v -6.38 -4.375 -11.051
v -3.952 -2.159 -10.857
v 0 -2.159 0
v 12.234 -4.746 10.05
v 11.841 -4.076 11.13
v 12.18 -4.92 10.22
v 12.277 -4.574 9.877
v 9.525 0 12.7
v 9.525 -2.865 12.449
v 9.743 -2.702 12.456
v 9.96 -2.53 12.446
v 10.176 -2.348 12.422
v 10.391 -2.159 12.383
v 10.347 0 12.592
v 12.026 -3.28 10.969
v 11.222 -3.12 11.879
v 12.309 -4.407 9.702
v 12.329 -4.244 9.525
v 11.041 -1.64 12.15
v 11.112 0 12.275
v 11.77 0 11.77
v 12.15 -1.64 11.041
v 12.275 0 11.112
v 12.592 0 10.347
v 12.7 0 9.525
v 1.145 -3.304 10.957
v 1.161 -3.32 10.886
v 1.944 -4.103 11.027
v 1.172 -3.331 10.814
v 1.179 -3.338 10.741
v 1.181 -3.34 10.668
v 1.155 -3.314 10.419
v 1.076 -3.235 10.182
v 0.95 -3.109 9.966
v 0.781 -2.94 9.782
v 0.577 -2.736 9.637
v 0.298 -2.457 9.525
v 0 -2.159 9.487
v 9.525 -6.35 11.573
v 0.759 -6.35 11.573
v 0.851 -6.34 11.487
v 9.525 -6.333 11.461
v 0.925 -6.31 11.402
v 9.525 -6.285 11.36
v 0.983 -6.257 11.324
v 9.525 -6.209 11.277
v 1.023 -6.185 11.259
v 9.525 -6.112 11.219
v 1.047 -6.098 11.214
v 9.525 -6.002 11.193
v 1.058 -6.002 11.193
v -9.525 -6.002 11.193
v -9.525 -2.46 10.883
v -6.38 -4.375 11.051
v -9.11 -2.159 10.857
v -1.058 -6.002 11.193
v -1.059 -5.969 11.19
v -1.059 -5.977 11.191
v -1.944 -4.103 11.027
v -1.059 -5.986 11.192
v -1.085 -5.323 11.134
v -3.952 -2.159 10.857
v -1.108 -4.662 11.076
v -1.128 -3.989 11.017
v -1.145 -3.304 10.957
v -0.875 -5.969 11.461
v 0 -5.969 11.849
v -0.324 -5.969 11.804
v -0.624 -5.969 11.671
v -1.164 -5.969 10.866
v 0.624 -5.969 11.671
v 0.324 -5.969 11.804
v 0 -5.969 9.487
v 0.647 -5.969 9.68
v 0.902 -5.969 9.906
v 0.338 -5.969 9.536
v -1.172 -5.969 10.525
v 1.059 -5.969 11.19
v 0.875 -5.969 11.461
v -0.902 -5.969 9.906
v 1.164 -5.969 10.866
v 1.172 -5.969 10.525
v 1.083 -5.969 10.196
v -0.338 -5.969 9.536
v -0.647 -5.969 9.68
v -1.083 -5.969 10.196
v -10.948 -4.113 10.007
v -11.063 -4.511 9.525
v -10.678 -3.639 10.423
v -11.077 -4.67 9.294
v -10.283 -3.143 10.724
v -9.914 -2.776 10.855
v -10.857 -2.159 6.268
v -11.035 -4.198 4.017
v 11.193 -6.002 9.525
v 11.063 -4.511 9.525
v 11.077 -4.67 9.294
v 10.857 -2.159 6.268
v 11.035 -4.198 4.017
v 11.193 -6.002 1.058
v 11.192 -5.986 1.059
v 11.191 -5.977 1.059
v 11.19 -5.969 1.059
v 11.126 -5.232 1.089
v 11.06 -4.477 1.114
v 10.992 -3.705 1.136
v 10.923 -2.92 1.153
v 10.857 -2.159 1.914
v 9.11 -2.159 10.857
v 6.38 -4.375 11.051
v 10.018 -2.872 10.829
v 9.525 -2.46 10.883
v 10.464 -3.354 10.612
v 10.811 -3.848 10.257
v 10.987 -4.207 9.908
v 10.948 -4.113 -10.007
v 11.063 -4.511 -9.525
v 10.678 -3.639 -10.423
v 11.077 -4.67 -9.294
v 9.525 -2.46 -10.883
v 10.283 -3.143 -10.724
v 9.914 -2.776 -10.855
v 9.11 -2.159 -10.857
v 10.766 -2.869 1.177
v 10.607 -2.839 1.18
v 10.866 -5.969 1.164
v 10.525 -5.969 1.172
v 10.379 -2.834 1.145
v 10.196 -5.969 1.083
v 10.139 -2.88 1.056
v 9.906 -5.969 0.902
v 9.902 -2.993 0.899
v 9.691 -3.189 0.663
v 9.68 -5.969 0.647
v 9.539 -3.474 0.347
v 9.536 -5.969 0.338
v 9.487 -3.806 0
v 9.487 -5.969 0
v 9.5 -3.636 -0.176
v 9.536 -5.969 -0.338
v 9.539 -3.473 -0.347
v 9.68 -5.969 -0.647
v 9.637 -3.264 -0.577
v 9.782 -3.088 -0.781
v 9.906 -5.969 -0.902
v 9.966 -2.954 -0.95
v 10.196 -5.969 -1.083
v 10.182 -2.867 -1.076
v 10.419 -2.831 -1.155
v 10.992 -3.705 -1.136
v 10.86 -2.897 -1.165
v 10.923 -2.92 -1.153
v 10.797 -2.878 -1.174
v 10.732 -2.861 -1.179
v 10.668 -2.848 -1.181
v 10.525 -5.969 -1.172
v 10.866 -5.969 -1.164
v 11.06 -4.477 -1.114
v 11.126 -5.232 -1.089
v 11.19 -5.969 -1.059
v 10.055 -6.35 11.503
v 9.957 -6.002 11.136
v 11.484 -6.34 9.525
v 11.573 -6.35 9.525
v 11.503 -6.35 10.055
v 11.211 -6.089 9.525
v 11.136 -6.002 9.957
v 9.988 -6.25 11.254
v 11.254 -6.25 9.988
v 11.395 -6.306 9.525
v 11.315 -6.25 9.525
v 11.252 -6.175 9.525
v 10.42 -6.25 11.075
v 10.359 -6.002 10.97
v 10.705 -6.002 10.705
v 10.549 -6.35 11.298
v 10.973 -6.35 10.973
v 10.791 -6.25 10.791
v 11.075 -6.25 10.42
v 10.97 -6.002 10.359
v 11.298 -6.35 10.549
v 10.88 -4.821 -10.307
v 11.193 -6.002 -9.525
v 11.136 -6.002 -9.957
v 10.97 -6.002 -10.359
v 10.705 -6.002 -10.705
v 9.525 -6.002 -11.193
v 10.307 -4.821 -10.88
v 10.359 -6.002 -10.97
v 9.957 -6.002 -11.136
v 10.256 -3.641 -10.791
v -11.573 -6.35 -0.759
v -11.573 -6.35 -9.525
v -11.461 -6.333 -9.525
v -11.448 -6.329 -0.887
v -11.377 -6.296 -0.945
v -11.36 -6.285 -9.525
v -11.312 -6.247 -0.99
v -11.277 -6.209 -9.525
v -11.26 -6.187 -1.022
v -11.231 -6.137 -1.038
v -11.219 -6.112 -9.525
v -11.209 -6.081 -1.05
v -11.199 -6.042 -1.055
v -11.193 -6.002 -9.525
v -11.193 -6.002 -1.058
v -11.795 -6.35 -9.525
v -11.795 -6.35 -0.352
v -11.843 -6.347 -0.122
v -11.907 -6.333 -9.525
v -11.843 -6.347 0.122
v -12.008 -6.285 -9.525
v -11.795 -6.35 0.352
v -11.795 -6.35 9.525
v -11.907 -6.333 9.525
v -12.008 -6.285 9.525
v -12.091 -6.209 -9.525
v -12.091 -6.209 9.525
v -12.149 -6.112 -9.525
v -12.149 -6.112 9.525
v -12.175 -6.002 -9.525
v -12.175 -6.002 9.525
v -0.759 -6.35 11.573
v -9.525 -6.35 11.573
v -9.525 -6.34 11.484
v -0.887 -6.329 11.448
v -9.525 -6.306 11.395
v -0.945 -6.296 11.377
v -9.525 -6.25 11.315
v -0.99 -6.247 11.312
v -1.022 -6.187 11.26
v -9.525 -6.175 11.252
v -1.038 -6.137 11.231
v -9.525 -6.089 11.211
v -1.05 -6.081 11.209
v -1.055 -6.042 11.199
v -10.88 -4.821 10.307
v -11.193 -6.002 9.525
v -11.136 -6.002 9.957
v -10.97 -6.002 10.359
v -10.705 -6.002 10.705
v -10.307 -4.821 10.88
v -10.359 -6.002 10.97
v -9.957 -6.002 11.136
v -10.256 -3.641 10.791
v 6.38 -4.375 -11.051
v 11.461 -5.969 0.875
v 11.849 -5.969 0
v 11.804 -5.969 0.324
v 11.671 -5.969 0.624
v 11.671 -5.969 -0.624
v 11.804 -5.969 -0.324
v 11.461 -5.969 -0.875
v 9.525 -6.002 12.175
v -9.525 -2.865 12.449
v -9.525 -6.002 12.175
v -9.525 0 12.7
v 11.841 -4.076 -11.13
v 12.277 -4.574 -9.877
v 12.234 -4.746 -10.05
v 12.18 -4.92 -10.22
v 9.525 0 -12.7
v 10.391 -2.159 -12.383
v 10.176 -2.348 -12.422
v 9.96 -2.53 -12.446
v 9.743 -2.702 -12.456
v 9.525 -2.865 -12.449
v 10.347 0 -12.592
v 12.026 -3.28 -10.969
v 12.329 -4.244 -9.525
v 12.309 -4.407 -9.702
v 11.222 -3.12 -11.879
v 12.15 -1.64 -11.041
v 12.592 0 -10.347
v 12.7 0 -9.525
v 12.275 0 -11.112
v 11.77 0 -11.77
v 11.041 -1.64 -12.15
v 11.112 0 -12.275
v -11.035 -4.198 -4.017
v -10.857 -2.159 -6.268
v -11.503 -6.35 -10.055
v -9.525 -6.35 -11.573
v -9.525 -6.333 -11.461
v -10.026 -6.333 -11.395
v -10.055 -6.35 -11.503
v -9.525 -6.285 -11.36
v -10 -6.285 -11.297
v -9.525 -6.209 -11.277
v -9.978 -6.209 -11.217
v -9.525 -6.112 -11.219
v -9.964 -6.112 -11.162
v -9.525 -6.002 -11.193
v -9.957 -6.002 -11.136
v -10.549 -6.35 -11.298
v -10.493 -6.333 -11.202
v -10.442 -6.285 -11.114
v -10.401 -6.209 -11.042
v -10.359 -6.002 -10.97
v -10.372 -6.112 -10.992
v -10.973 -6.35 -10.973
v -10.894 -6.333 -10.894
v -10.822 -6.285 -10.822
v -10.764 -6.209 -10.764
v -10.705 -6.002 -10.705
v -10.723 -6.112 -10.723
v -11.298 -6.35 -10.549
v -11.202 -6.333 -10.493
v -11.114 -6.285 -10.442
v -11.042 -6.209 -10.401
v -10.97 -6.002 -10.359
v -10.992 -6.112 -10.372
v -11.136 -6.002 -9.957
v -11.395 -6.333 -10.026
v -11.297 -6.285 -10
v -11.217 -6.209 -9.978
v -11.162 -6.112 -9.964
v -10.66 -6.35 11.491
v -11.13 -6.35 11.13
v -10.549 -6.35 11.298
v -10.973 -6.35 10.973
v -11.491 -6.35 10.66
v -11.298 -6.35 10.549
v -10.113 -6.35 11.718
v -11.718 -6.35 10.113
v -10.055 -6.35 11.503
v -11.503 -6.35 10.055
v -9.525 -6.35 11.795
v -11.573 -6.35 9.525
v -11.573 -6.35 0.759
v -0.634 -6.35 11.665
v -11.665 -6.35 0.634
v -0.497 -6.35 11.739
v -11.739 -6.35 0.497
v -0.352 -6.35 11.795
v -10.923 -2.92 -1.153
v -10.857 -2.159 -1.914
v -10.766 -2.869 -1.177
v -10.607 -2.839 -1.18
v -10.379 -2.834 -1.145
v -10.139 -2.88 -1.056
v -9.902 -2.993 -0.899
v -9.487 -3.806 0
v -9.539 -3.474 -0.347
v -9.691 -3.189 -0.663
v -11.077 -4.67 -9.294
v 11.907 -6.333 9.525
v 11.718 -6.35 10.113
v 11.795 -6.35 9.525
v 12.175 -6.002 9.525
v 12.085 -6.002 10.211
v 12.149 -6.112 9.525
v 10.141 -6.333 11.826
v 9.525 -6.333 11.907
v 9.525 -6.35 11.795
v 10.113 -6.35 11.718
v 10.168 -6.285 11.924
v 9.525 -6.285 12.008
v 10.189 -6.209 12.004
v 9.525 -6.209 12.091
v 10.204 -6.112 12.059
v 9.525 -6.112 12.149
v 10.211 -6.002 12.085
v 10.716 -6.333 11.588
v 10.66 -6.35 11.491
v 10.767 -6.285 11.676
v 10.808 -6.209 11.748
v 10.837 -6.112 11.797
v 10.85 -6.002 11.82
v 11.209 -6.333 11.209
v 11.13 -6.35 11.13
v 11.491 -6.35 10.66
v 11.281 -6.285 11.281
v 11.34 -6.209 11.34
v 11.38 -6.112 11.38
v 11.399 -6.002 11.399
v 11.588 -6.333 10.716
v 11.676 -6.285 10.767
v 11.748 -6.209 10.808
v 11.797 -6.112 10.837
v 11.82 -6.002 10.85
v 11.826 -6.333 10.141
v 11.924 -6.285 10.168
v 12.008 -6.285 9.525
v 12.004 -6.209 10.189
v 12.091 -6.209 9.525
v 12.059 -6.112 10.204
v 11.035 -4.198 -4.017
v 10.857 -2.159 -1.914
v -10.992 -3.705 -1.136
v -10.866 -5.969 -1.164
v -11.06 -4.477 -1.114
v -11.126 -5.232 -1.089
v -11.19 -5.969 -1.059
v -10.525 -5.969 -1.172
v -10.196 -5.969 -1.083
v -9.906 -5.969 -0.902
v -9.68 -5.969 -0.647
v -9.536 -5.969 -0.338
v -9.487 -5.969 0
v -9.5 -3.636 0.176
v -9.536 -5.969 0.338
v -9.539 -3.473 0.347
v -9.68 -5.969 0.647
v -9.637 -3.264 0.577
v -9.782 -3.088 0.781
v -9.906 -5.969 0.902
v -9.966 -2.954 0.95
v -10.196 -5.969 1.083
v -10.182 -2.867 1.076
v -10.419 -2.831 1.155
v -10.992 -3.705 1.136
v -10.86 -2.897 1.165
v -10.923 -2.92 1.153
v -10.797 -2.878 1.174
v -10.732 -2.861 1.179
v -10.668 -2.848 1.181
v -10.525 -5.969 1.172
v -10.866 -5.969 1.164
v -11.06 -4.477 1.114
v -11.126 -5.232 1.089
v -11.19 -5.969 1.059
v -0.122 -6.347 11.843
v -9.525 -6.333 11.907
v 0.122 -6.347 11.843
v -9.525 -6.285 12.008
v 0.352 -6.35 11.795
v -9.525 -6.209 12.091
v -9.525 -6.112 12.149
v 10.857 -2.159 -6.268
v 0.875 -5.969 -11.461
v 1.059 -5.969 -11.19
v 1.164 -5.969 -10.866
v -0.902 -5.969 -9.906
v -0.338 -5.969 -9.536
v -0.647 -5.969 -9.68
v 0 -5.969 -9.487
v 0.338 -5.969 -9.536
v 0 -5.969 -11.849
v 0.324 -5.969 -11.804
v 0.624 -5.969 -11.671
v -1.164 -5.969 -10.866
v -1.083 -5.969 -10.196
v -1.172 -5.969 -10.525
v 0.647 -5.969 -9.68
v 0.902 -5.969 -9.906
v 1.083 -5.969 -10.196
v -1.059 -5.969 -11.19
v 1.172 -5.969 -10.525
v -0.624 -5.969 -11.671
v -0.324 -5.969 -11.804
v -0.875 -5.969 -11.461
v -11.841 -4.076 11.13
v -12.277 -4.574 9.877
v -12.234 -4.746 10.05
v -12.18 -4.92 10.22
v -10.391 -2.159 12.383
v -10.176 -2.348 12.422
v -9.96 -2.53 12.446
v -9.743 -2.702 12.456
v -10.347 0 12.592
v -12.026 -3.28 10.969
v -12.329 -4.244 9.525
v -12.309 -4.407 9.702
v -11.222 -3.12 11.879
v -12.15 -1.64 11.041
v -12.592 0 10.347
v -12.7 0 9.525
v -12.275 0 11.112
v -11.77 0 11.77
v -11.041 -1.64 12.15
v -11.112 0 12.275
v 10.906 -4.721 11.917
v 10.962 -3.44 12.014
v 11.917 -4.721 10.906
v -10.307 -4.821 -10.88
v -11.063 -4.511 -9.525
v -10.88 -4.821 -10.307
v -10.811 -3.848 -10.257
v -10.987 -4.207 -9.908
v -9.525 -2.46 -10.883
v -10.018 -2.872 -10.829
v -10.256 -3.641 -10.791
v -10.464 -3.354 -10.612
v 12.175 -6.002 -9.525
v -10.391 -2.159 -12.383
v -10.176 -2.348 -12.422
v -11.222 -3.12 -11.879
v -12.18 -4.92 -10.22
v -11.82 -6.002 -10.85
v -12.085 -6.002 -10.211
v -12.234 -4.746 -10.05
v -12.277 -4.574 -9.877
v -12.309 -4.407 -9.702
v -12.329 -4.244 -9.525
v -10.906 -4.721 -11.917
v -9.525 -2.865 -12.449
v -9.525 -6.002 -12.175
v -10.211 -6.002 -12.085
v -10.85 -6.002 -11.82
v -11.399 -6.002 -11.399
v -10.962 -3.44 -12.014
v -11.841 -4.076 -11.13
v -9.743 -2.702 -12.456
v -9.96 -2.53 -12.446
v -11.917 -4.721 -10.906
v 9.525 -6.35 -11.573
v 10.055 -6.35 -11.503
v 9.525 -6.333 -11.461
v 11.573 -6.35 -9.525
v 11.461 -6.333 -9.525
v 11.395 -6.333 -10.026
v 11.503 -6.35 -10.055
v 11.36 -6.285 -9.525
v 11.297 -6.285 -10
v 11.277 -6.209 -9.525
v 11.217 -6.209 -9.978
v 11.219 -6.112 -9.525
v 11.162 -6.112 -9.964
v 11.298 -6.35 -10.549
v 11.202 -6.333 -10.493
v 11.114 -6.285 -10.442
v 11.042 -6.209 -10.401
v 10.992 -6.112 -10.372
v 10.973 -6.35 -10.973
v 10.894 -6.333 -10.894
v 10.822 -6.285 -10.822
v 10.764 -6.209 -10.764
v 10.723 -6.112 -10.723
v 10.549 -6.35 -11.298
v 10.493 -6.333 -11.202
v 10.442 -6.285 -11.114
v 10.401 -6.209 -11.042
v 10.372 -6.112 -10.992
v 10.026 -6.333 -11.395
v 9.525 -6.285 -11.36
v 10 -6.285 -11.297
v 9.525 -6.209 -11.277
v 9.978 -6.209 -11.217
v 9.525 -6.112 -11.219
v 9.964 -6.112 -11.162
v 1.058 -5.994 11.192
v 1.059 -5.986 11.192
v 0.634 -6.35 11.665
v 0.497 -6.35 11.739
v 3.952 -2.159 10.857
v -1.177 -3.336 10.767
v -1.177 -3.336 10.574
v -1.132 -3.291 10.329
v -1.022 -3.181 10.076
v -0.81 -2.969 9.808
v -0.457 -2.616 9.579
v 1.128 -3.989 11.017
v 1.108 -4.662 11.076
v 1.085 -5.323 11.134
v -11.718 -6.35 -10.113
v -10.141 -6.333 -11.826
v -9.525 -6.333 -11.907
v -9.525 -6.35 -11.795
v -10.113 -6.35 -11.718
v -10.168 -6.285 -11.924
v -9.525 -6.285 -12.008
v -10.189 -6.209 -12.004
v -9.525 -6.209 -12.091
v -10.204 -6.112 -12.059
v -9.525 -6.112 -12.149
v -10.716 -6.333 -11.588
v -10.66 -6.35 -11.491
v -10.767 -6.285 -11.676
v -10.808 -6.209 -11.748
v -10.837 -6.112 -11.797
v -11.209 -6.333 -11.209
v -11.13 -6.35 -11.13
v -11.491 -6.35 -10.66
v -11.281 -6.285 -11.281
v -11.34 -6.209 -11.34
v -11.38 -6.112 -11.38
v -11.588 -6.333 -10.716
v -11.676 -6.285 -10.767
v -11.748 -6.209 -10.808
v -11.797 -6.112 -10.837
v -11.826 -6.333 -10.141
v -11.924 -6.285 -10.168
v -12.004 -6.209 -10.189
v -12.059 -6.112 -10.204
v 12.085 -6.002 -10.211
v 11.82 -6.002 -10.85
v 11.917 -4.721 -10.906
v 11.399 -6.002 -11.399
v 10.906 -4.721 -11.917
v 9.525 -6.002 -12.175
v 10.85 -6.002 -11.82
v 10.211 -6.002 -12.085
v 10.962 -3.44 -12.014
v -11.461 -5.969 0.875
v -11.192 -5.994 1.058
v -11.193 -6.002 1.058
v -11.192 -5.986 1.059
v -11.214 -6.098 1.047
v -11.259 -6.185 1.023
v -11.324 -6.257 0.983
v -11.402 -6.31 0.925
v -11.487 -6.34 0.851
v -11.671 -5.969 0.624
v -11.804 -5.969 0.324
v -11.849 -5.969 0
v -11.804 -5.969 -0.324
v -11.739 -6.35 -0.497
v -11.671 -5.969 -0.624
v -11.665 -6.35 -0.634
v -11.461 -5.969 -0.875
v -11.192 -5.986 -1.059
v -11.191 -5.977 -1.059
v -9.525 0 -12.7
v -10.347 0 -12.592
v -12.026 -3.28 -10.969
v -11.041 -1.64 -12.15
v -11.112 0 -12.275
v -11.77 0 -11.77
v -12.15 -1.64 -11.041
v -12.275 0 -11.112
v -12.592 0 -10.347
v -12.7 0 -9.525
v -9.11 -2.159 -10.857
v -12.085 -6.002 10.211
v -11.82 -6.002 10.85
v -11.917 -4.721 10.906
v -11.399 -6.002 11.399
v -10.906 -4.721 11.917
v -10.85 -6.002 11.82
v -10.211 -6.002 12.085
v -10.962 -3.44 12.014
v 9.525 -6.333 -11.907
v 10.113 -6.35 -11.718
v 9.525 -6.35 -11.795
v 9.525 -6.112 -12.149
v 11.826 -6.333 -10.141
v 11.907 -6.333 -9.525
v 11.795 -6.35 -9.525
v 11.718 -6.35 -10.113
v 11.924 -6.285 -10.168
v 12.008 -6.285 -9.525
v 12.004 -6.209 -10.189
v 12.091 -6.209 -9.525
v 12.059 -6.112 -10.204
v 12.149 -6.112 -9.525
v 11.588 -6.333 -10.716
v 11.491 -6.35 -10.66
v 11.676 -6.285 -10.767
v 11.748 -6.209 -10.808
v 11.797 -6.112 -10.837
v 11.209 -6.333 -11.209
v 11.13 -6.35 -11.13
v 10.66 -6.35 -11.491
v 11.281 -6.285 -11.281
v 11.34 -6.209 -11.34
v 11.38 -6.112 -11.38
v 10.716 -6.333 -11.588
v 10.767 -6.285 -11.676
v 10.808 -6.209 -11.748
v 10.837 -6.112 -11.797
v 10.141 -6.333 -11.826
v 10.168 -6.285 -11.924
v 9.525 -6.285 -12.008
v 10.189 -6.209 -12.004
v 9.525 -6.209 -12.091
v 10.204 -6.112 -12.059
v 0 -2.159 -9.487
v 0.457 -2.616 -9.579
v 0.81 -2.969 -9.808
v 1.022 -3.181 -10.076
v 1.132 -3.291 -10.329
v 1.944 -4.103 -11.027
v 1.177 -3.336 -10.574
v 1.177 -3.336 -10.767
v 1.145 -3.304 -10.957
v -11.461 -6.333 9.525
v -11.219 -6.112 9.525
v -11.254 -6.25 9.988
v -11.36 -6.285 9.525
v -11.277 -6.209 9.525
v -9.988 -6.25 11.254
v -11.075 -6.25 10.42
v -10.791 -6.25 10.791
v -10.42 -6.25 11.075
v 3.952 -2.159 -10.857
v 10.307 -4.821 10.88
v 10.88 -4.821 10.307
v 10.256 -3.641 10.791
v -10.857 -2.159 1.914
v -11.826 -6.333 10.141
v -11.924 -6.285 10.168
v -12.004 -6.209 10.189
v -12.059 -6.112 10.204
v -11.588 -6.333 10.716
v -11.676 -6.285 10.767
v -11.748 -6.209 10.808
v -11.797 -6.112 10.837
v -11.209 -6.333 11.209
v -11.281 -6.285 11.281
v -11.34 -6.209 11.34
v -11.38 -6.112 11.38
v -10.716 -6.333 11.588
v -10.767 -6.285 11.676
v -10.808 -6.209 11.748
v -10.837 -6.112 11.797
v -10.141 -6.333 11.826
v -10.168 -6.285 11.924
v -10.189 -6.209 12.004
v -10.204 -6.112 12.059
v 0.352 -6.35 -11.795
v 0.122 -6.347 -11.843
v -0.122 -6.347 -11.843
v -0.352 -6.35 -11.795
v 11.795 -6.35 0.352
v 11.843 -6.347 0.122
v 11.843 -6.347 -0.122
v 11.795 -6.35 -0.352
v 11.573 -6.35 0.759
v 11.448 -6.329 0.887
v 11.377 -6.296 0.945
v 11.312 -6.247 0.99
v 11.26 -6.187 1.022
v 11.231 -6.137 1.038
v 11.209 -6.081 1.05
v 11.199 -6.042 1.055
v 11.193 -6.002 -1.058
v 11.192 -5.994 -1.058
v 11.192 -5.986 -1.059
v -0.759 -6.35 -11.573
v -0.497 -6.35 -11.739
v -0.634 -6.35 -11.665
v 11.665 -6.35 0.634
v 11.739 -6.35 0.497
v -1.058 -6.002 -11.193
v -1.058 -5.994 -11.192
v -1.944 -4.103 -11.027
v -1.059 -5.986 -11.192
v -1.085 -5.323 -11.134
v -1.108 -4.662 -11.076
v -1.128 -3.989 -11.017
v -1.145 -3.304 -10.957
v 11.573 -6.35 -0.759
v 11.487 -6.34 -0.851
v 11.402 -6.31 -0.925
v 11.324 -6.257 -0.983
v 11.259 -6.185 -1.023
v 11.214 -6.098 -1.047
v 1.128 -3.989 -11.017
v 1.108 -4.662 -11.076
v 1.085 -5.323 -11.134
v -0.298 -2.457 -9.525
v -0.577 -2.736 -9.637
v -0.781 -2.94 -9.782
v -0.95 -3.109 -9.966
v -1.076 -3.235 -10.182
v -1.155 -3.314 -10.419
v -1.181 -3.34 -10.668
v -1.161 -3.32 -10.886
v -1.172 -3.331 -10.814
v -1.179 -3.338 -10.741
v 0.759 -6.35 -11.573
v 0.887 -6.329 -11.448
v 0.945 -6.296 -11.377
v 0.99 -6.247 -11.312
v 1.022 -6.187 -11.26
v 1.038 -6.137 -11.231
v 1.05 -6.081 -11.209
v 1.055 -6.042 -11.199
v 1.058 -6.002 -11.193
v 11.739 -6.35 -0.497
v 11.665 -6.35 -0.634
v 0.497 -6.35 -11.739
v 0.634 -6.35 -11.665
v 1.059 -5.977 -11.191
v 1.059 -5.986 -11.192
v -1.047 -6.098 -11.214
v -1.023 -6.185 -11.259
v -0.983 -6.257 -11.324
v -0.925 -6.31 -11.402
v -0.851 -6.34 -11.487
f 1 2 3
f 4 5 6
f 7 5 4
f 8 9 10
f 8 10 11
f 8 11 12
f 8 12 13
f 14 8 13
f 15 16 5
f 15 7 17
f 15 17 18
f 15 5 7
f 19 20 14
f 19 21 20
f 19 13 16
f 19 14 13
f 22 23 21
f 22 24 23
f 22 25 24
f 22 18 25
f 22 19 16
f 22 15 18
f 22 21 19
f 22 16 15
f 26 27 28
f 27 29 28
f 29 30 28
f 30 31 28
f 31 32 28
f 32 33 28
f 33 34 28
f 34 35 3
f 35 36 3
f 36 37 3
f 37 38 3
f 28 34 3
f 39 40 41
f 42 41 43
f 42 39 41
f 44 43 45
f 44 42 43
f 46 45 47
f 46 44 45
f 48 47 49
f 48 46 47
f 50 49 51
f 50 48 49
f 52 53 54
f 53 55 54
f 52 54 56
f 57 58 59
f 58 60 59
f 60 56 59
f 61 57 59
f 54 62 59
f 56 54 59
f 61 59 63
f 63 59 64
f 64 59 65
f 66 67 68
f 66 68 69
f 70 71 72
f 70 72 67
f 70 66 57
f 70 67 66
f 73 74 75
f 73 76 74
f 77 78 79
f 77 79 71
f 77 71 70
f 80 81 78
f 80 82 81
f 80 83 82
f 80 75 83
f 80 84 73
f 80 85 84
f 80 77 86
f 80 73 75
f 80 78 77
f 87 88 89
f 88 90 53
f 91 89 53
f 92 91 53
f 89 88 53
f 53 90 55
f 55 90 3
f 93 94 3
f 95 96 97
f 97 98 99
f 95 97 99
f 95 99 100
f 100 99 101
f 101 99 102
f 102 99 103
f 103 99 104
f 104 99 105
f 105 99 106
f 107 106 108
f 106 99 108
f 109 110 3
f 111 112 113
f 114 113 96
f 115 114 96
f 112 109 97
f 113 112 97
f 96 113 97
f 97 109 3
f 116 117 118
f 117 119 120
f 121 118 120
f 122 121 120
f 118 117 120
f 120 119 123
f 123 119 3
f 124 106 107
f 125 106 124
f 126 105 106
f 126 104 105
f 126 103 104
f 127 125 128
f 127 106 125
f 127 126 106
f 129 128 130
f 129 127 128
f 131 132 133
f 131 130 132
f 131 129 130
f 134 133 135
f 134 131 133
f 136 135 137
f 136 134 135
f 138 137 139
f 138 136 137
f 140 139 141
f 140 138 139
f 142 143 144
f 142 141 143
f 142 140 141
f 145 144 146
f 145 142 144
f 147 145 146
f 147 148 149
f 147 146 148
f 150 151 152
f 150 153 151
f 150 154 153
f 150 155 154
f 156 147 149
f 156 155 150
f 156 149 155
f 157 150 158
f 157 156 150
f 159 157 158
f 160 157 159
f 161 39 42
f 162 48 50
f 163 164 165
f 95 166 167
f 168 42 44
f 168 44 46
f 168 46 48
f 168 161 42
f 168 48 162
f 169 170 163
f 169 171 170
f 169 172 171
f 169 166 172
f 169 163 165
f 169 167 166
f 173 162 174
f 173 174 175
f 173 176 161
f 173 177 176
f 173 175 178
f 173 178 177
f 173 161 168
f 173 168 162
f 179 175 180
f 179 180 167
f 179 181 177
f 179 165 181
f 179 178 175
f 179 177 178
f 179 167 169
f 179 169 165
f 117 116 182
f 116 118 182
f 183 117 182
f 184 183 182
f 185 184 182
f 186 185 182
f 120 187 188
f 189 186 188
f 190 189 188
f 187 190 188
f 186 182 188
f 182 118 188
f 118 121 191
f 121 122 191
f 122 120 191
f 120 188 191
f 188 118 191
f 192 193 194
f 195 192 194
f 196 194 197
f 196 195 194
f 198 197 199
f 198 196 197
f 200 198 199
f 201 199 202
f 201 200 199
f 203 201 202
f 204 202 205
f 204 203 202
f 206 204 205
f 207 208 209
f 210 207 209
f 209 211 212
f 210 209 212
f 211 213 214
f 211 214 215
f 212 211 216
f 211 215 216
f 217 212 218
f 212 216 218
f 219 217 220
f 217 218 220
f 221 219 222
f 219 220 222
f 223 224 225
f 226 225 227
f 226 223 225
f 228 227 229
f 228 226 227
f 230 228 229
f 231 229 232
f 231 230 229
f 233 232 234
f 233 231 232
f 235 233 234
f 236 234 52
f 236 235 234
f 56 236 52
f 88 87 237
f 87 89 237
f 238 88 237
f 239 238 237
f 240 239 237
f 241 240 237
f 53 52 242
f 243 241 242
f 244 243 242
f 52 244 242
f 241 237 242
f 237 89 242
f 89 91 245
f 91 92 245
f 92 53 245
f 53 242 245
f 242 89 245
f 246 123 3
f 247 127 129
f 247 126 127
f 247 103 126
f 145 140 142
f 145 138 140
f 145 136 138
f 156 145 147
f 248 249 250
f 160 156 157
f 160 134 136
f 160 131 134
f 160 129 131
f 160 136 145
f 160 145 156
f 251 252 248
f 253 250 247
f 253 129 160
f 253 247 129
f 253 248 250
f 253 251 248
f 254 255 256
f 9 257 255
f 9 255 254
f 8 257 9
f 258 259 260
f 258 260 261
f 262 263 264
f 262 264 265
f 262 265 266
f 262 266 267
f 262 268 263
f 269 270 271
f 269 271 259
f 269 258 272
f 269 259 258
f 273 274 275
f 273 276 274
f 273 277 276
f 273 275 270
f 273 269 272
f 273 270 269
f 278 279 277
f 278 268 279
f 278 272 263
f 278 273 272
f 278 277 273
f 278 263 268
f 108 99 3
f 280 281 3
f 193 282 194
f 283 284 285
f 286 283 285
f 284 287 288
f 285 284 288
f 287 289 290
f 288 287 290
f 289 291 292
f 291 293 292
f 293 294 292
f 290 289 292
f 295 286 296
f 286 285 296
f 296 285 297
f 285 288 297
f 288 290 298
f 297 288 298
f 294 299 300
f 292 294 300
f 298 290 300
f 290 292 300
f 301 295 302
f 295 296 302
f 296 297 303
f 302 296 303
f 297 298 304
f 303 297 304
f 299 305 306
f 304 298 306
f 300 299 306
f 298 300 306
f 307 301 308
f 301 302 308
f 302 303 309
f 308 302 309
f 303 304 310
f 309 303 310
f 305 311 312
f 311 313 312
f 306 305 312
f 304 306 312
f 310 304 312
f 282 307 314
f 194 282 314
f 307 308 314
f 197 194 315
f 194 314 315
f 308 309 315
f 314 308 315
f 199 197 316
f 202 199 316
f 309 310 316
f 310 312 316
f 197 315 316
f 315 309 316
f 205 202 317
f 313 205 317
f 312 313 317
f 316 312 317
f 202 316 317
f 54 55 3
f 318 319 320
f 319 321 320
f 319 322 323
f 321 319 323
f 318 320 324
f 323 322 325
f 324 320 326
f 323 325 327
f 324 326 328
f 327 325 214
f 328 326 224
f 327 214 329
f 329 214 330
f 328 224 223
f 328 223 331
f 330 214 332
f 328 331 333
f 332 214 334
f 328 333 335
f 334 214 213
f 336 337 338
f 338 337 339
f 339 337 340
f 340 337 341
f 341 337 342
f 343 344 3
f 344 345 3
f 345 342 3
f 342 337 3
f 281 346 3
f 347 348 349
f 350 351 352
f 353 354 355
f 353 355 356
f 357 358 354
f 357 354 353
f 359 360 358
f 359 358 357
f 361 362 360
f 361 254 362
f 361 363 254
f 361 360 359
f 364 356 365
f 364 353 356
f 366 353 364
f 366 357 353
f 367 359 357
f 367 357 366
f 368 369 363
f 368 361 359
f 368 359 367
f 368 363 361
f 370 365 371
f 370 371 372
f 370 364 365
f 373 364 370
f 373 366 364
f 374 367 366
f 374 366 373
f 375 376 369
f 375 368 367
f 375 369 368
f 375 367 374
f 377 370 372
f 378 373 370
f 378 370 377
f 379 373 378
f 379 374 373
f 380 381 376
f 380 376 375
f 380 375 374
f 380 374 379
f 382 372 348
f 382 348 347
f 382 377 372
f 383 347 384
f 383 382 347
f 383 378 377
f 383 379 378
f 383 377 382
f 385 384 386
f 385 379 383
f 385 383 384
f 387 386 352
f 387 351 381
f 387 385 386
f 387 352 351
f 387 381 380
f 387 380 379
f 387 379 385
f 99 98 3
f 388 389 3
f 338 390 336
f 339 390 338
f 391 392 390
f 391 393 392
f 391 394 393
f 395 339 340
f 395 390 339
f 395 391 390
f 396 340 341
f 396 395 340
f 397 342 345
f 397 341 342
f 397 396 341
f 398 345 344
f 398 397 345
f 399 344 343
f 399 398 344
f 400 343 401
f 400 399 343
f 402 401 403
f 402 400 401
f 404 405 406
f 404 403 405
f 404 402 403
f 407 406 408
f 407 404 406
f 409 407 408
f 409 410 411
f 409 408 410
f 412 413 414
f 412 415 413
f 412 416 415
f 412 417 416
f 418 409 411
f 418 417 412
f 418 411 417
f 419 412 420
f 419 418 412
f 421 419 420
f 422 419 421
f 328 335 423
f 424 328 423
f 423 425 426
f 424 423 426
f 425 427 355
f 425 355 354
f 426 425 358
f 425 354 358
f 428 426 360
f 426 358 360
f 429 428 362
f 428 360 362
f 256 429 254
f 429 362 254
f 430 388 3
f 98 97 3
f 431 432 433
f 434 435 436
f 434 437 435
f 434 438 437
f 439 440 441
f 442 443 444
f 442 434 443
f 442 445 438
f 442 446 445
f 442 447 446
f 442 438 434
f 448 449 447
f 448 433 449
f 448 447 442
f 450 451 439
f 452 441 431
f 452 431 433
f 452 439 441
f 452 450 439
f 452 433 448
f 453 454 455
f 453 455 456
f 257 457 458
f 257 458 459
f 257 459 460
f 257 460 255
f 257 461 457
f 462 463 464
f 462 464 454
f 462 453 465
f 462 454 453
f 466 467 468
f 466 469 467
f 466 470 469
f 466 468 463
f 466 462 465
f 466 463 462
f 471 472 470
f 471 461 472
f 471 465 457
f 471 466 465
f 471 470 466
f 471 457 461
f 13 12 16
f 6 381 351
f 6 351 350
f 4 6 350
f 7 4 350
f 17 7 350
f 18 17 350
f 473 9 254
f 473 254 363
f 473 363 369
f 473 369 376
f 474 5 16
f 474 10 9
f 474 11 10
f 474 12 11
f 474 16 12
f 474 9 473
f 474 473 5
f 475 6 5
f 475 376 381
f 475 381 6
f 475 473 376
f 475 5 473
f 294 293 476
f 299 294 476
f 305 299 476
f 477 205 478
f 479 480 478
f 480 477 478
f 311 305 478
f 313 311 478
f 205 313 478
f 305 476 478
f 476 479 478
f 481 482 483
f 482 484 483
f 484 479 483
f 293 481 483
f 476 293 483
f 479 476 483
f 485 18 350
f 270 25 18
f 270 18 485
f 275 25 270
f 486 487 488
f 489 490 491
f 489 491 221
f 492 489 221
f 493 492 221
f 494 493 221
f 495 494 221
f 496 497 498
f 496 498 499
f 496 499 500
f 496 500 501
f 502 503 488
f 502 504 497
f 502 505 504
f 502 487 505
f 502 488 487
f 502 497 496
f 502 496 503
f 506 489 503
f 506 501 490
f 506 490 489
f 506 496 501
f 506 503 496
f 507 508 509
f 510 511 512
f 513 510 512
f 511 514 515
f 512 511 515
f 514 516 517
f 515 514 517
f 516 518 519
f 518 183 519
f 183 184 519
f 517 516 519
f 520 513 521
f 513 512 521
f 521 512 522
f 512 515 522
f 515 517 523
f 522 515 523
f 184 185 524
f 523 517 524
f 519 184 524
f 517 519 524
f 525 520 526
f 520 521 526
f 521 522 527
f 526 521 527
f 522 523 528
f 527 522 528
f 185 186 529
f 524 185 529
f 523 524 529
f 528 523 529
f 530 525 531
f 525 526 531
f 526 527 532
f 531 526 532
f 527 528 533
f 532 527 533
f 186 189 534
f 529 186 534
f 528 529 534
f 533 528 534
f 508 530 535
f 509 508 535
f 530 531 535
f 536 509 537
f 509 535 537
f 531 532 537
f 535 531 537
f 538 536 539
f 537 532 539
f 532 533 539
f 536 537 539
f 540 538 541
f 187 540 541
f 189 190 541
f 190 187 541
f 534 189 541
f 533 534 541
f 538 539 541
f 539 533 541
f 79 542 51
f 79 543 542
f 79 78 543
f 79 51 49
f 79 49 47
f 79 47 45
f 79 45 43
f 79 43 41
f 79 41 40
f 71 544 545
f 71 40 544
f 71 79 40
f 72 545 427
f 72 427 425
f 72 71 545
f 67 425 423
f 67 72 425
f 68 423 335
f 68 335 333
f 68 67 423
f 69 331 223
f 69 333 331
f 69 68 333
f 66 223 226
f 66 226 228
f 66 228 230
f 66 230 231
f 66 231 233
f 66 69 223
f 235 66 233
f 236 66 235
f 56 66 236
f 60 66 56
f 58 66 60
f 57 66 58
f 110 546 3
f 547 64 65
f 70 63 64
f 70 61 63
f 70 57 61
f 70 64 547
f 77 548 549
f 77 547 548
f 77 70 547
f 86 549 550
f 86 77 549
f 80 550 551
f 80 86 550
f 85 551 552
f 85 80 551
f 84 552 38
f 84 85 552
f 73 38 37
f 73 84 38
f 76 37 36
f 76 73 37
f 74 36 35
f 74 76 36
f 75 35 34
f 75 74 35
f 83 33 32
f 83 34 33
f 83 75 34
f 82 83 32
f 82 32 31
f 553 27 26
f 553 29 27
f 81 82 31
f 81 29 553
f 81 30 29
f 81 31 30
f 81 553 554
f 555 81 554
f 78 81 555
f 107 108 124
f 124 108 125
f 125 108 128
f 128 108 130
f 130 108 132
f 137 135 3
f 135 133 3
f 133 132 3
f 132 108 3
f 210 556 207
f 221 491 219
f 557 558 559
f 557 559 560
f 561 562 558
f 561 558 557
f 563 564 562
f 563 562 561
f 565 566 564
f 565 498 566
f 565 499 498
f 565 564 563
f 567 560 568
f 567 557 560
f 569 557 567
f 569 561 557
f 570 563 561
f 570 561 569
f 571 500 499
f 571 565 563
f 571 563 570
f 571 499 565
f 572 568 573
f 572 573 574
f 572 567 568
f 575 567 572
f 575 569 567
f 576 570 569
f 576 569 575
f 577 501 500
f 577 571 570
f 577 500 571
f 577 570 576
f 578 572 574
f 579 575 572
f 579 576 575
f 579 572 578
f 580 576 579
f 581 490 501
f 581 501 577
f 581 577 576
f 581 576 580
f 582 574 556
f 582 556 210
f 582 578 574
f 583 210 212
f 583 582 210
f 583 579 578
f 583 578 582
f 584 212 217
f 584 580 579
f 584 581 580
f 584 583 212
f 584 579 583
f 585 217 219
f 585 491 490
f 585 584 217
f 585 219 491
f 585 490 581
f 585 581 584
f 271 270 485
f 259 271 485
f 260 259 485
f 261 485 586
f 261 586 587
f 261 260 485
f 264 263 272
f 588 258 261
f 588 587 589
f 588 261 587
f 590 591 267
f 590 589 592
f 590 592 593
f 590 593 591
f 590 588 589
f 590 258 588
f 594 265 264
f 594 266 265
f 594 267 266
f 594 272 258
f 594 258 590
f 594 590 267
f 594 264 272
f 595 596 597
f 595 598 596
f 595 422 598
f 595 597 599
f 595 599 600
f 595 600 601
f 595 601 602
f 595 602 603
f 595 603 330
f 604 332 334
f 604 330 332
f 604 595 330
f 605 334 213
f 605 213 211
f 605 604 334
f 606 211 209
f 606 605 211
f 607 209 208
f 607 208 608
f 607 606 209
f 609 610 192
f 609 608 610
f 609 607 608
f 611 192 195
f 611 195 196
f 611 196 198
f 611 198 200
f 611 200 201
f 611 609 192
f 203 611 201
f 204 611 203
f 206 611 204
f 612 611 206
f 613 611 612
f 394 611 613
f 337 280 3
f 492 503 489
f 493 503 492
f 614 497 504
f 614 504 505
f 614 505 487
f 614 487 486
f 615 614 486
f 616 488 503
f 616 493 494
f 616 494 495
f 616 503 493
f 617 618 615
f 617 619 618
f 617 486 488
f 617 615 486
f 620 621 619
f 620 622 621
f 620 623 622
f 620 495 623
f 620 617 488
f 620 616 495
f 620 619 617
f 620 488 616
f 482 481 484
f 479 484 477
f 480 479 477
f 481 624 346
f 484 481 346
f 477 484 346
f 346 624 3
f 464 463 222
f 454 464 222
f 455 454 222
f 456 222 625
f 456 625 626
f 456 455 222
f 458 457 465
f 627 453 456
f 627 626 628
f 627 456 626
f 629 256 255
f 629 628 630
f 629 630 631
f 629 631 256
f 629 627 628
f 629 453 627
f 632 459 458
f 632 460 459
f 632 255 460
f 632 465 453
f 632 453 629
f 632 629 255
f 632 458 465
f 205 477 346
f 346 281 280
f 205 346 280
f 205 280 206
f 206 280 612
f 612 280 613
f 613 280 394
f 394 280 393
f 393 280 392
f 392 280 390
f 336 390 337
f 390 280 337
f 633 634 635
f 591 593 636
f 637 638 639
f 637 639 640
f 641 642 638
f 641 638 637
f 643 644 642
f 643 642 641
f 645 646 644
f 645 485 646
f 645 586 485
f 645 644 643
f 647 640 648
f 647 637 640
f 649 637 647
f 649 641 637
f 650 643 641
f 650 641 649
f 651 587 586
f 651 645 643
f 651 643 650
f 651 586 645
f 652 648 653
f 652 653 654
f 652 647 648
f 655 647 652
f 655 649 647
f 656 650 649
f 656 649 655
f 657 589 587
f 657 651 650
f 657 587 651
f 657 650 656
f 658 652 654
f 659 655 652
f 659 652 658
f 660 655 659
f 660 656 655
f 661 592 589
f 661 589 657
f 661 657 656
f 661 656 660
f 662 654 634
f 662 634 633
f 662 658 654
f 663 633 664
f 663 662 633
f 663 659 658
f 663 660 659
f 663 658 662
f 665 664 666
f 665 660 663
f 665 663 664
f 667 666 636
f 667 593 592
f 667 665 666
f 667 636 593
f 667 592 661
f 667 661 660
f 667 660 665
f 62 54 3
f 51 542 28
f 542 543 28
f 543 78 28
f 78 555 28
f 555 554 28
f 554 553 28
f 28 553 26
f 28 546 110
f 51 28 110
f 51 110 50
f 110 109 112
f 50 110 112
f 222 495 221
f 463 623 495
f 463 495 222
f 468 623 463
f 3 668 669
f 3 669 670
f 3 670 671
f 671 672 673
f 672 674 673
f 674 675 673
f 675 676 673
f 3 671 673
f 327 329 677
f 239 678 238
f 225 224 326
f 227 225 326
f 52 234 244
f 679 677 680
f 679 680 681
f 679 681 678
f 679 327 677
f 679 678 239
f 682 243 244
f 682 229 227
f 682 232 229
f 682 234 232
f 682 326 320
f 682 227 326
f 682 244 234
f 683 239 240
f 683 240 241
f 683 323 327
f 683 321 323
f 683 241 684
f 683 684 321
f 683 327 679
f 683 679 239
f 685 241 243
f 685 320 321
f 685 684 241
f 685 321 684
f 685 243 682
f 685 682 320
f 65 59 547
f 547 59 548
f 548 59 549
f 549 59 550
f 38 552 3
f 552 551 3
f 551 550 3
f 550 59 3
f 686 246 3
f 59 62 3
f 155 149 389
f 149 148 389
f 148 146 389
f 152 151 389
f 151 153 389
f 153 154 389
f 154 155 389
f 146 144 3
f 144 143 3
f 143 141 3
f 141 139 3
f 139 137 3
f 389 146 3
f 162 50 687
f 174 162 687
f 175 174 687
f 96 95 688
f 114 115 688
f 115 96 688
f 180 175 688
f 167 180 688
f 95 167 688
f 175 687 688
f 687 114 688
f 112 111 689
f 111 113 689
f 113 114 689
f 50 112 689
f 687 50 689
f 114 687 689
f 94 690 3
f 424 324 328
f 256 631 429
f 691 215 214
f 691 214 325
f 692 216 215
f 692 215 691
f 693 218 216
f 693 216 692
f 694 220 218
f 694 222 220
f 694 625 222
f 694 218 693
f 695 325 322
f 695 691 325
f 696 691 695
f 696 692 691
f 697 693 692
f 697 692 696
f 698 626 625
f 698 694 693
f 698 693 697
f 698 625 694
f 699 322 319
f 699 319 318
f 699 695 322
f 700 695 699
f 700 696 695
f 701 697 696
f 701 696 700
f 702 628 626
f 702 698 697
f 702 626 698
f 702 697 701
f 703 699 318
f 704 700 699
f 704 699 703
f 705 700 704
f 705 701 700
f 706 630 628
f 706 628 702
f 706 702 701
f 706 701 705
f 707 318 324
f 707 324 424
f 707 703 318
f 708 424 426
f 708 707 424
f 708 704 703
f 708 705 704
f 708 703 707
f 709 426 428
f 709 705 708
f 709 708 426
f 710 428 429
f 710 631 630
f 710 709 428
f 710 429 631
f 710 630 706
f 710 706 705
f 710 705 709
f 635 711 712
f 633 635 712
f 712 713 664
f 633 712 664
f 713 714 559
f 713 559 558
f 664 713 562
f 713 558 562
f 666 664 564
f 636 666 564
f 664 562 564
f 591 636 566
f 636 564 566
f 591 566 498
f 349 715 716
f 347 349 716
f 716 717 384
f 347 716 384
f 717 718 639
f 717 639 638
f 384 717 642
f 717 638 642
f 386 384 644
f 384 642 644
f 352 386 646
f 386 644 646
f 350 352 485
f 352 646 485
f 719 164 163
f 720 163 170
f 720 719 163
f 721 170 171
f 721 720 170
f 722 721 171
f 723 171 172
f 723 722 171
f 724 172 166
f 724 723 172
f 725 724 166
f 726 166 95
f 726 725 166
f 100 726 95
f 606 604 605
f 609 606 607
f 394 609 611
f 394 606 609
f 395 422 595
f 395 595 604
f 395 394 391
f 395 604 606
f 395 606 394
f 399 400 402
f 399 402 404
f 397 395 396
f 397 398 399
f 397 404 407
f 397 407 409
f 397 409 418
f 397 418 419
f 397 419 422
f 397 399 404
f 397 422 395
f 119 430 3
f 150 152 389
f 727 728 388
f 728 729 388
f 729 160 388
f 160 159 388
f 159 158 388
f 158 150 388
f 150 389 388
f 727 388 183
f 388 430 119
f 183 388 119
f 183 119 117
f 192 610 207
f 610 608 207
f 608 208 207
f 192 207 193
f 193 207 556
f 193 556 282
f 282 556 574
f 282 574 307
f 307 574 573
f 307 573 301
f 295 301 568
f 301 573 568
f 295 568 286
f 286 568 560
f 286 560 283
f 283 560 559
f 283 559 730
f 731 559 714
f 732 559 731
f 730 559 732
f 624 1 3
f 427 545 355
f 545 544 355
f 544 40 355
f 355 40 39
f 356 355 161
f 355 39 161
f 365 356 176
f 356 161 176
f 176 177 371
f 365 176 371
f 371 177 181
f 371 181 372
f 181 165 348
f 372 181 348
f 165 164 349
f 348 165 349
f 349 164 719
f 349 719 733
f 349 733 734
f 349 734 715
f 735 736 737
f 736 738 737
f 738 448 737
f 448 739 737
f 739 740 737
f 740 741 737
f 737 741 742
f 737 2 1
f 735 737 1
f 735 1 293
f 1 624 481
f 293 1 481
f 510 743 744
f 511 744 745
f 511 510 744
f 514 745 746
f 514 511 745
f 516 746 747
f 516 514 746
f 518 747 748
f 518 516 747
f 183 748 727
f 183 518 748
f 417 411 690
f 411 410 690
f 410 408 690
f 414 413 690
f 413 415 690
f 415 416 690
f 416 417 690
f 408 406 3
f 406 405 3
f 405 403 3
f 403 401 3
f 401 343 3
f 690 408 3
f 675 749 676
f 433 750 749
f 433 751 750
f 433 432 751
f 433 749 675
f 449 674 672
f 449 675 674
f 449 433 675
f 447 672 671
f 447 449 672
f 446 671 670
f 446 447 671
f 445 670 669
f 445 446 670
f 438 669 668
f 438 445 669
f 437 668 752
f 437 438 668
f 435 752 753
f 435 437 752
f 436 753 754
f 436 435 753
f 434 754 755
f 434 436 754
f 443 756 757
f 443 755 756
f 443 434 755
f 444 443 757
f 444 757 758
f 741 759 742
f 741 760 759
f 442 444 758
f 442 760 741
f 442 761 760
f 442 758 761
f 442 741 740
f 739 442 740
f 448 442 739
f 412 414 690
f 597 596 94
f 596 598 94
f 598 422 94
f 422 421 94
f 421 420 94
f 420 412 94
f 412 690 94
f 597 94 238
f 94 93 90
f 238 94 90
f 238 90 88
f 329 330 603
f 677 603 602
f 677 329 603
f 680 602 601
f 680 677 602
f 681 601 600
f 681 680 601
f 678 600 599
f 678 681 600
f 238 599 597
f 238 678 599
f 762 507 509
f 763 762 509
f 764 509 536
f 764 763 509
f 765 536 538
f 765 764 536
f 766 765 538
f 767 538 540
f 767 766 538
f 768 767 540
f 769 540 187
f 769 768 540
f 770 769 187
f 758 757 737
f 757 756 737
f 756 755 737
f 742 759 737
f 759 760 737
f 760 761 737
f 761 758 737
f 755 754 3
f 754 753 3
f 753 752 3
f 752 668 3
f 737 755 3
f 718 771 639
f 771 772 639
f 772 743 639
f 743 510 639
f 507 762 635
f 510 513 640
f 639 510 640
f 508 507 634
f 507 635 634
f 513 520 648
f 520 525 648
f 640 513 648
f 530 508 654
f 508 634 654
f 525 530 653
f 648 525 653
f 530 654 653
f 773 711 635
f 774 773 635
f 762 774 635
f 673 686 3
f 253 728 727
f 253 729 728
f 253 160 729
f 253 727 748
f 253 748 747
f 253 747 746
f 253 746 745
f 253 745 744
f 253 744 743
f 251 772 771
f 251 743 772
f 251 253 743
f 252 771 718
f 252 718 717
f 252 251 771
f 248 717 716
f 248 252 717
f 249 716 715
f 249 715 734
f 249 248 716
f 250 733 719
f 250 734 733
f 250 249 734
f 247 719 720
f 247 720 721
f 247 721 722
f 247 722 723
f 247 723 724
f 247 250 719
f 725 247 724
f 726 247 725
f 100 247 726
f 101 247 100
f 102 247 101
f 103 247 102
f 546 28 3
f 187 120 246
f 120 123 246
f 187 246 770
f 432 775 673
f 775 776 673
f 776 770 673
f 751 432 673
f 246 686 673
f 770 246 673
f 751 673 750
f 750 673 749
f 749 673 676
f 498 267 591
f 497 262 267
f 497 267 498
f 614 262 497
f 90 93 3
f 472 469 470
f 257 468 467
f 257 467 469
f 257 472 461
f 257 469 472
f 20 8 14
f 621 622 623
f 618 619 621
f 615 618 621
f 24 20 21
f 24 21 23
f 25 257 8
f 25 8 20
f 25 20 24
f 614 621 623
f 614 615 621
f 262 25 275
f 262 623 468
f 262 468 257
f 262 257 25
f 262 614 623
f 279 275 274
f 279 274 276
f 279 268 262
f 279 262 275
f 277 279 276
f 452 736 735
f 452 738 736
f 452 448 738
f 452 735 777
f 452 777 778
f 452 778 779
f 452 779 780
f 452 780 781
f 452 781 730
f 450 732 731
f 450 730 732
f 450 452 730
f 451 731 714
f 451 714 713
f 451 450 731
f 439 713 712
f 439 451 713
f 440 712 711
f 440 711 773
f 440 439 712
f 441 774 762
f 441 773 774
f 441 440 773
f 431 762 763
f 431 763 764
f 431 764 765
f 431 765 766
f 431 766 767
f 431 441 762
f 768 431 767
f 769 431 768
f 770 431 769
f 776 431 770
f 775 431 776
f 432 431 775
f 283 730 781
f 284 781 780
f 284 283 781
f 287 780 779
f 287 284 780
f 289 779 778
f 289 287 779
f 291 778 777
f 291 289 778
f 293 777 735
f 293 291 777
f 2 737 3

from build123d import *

# Parameters (mm, degrees)
BOSS_EXTRUDE1_DEPTH = 6.35
BOSS_EXTRUDE1_DRAFT = -5
CUT_EXTRUDE3_DEPTH  = 20.05
CIRPATTERN3_COUNT   = 18
BOSS_EXTRUDE3_DEPTH = 6.35
BOSS_EXTRUDE3_DRAFT = -5
FILLET2_R           = 0.381
BOSS_EXTRUDE4_REACH = 20.926
SKETCH8_R           = 1.1811
SKETCH9_R           = 1.1811
CUT_EXTRUDE4_DEPTH  = 19.926409089
CIRPATTERN4_COUNT   = 4


with BuildPart() as part:
    # Sketch1 → Boss-Extrude1 (with draft: the straight prism first)
    with BuildSketch(Plane(origin=(0, 0, 0), x_dir=(1, 0, 0), z_dir=(0, 1, 0))):
        with BuildLine():
            Line((-9.525, -12.7), (9.525, -12.7))
            ThreePointArc((9.525, -12.7), (11.77006403, -11.77006403), (12.7, -9.525))
            Line((12.7, -9.525), (12.7, 9.525))
            ThreePointArc((12.7, 9.525), (11.77006403, 11.77006403), (9.525, 12.7))
            Line((9.525, 12.7), (-9.525, 12.7))
            ThreePointArc((-9.525, 12.7), (-11.77006403, 11.77006403), (-12.7, 9.525))
            Line((-12.7, 9.525), (-12.7, -9.525))
            ThreePointArc((-12.7, -9.525), (-11.77006403, -11.77006403), (-9.525, -12.7))
        make_face()
    extrude(amount=-BOSS_EXTRUDE1_DEPTH)
    # Boss-Extrude1: the draft: its side faces are tilted about the plane it starts from
    boss_extrude1_sides = [part.faces().sort_by_distance(p)[0] for p in [
        (0, -3.175, 12.7),
        (11.77006403, -3.175, 11.77006403),
        (12.7, -3.175, 0),
        (11.77006403, -3.175, -11.77006403),
        (0, -3.175, -12.7),
        (-11.77006403, -3.175, -11.77006403),
        (-12.7, -3.175, 0),
        (-11.77006403, -3.175, 11.77006403),
    ]]
    draft(boss_extrude1_sides, Plane(origin=(0, 0, 0), x_dir=(1, 0, 0), z_dir=(0, 1, 0)), BOSS_EXTRUDE1_DRAFT)

    # Sketch6 → Cut-Extrude3 (cut, through all)
    with BuildSketch(Plane.XY):
        Polygon((0, -2.159), (-7.366, -9.525), (7.366, -9.525), align=None)
    cut_extrude3 = extrude(amount=-CUT_EXTRUDE3_DEPTH, mode=Mode.SUBTRACT)

    # CirPattern3: Cut-Extrude3 ×18 about axis
    cirpattern3_axis = Axis((0, 0, 0), (0, 1, 0))
    for i in range(1, CIRPATTERN3_COUNT):
        add(cut_extrude3.rotate(cirpattern3_axis, i * 360 / CIRPATTERN3_COUNT), mode=Mode.SUBTRACT)


with BuildPart() as boss_extrude3_tool:
    # Sketch7 → Boss-Extrude3 (with draft: the straight prism first)
    with BuildSketch(Plane(origin=(0, 0, 0), x_dir=(1, 0, 0), z_dir=(0, 1, 0))):
        with BuildLine():
            Line((-9.525, -12.7), (9.525, -12.7))
            ThreePointArc((9.525, -12.7), (11.77006403, -11.77006403), (12.7, -9.525))
            Line((12.7, -9.525), (12.7, 9.525))
            ThreePointArc((12.7, 9.525), (11.77006403, 11.77006403), (9.525, 12.7))
            Line((9.525, 12.7), (-9.525, 12.7))
            ThreePointArc((-9.525, 12.7), (-11.77006403, 11.77006403), (-12.7, 9.525))
            Line((-12.7, 9.525), (-12.7, -9.525))
            ThreePointArc((-12.7, -9.525), (-11.77006403, -11.77006403), (-9.525, -12.7))
        make_face()
        with BuildLine():
            Line((-9.525, -10.668), (9.525, -10.668))
            ThreePointArc((9.525, -10.668), (10.333223051, -10.333223051), (10.668, -9.525))
            Line((10.668, -9.525), (10.668, 9.525))
            ThreePointArc((10.668, 9.525), (10.333223051, 10.333223051), (9.525, 10.668))
            Line((9.525, 10.668), (-9.525, 10.668))
            ThreePointArc((-9.525, 10.668), (-10.333223051, 10.333223051), (-10.668, 9.525))
            Line((-10.668, 9.525), (-10.668, -9.525))
            ThreePointArc((-10.668, -9.525), (-10.333223051, -10.333223051), (-9.525, -10.668))
        make_face(mode=Mode.SUBTRACT)
    extrude(amount=-BOSS_EXTRUDE3_DEPTH)
    # Boss-Extrude3: the draft: its side faces are tilted about the plane it starts from
    boss_extrude3_sides = [boss_extrude3_tool.faces().sort_by_distance(p)[0] for p in [
        (0, -3.175, 12.7),
        (11.77006403, -3.175, 11.77006403),
        (12.7, -3.175, 0),
        (11.77006403, -3.175, -11.77006403),
        (0, -3.175, -12.7),
        (-11.77006403, -3.175, -11.77006403),
        (-12.7, -3.175, 0),
        (-11.77006403, -3.175, 11.77006403),
        (-10.333223051, -3.175, 10.333223051),
        (-10.668, -3.175, 0),
        (-10.333223051, -3.175, -10.333223051),
        (0, -3.175, -10.668),
        (10.333223051, -3.175, -10.333223051),
        (10.668, -3.175, 0),
        (10.333223051, -3.175, 10.333223051),
        (0, -3.175, 10.668),
    ]]
    draft(boss_extrude3_sides, Plane(origin=(0, 0, 0), x_dir=(1, 0, 0), z_dir=(0, 1, 0)), BOSS_EXTRUDE3_DRAFT)


with BuildPart() as part_1:
    add(part.part)

    # Boss-Extrude3: add boss_extrude3_tool
    add(boss_extrude3_tool.part)

    # Fillet2
    fillet2_edges = [part_1.edges().sort_by_distance(p)[0] for p in [
        (-11.377228727, -6.35, -11.377228727),
        (-11.377228727, -6.35, 11.377228727),
        (-12.144446987, -6.35, 0),
        (0, -6.35, 12.144446987),
        (11.377228727, -6.35, 11.377228727),
        (12.144446987, -6.35, 0),
        (11.377228727, -6.35, -11.377228727),
        (0, -6.35, -12.144446987),
        (-11.223553013, -6.35, 0),
        (-10.726058354, -6.35, 10.726058354),
        (0, -6.35, 11.223553013),
        (10.726058354, -6.35, 10.726058354),
        (11.223553013, -6.35, 0),
        (10.726058354, -6.35, -10.726058354),
        (0, -6.35, -11.223553013),
        (-10.726058354, -6.35, -10.726058354),
    ]]
    fillet(fillet2_edges, radius=FILLET2_R)

    # Sketch8 → Boss-Extrude4 (add, up to next)
    with BuildSketch(Plane(origin=(0, -5.969, 0), x_dir=(-1, 0, 0), z_dir=(0, -1, 0)), mode=Mode.PRIVATE) as boss_extrude4_sk1:
        with Locations((0, 10.668)):
            Circle(SKETCH8_R)
    boss_extrude4_tool1 = extrude(boss_extrude4_sk1.sketch, amount=-BOSS_EXTRUDE4_REACH, mode=Mode.PRIVATE) - part_1.part
    boss_extrude4 = boss_extrude4_tool1.solids().sort_by_distance((0, -5.969, -10.668))[0]
    add(boss_extrude4)

    # Sketch9 → Cut-Extrude4 (cut, through all)
    with BuildSketch(Plane.XZ.offset(5.969)):
        with Locations((0, -10.668)):
            Circle(SKETCH9_R)
    cut_extrude4 = extrude(amount=CUT_EXTRUDE4_DEPTH, mode=Mode.SUBTRACT)

    # CirPattern4: Boss-Extrude4, Cut-Extrude4; each copy of Boss-Extrude4 runs up to whatever stops it at its own place
    cirpattern4_before = part_1.part  # the part as the pattern finds it: every copy runs up to it
    cirpattern4_boss_extrude4_long = extrude(boss_extrude4_sk1.sketch, amount=-BOSS_EXTRUDE4_REACH, mode=Mode.PRIVATE)
    cirpattern4_boss_extrude4_tool = cirpattern4_boss_extrude4_long.rotate(Axis((0, 0, 0), (0, 1, 0)), 1 * 360 / CIRPATTERN4_COUNT) - cirpattern4_before
    add(cirpattern4_boss_extrude4_tool.solids().sort_by_distance((-10.668, -5.969, 0))[0])
    cirpattern4_boss_extrude4_tool = cirpattern4_boss_extrude4_long.rotate(Axis((0, 0, 0), (0, 1, 0)), 2 * 360 / CIRPATTERN4_COUNT) - cirpattern4_before
    add(cirpattern4_boss_extrude4_tool.solids().sort_by_distance((0, -5.969, 10.668))[0])
    cirpattern4_boss_extrude4_tool = cirpattern4_boss_extrude4_long.rotate(Axis((0, 0, 0), (0, 1, 0)), 3 * 360 / CIRPATTERN4_COUNT) - cirpattern4_before
    add(cirpattern4_boss_extrude4_tool.solids().sort_by_distance((10.668, -5.969, 0))[0])
    add(cut_extrude4.rotate(Axis((0, 0, 0), (0, 1, 0)), 1 * 360 / CIRPATTERN4_COUNT), mode=Mode.SUBTRACT)
    add(cut_extrude4.rotate(Axis((0, 0, 0), (0, 1, 0)), 2 * 360 / CIRPATTERN4_COUNT), mode=Mode.SUBTRACT)
    add(cut_extrude4.rotate(Axis((0, 0, 0), (0, 1, 0)), 3 * 360 / CIRPATTERN4_COUNT), mode=Mode.SUBTRACT)


solid = part_1.part
